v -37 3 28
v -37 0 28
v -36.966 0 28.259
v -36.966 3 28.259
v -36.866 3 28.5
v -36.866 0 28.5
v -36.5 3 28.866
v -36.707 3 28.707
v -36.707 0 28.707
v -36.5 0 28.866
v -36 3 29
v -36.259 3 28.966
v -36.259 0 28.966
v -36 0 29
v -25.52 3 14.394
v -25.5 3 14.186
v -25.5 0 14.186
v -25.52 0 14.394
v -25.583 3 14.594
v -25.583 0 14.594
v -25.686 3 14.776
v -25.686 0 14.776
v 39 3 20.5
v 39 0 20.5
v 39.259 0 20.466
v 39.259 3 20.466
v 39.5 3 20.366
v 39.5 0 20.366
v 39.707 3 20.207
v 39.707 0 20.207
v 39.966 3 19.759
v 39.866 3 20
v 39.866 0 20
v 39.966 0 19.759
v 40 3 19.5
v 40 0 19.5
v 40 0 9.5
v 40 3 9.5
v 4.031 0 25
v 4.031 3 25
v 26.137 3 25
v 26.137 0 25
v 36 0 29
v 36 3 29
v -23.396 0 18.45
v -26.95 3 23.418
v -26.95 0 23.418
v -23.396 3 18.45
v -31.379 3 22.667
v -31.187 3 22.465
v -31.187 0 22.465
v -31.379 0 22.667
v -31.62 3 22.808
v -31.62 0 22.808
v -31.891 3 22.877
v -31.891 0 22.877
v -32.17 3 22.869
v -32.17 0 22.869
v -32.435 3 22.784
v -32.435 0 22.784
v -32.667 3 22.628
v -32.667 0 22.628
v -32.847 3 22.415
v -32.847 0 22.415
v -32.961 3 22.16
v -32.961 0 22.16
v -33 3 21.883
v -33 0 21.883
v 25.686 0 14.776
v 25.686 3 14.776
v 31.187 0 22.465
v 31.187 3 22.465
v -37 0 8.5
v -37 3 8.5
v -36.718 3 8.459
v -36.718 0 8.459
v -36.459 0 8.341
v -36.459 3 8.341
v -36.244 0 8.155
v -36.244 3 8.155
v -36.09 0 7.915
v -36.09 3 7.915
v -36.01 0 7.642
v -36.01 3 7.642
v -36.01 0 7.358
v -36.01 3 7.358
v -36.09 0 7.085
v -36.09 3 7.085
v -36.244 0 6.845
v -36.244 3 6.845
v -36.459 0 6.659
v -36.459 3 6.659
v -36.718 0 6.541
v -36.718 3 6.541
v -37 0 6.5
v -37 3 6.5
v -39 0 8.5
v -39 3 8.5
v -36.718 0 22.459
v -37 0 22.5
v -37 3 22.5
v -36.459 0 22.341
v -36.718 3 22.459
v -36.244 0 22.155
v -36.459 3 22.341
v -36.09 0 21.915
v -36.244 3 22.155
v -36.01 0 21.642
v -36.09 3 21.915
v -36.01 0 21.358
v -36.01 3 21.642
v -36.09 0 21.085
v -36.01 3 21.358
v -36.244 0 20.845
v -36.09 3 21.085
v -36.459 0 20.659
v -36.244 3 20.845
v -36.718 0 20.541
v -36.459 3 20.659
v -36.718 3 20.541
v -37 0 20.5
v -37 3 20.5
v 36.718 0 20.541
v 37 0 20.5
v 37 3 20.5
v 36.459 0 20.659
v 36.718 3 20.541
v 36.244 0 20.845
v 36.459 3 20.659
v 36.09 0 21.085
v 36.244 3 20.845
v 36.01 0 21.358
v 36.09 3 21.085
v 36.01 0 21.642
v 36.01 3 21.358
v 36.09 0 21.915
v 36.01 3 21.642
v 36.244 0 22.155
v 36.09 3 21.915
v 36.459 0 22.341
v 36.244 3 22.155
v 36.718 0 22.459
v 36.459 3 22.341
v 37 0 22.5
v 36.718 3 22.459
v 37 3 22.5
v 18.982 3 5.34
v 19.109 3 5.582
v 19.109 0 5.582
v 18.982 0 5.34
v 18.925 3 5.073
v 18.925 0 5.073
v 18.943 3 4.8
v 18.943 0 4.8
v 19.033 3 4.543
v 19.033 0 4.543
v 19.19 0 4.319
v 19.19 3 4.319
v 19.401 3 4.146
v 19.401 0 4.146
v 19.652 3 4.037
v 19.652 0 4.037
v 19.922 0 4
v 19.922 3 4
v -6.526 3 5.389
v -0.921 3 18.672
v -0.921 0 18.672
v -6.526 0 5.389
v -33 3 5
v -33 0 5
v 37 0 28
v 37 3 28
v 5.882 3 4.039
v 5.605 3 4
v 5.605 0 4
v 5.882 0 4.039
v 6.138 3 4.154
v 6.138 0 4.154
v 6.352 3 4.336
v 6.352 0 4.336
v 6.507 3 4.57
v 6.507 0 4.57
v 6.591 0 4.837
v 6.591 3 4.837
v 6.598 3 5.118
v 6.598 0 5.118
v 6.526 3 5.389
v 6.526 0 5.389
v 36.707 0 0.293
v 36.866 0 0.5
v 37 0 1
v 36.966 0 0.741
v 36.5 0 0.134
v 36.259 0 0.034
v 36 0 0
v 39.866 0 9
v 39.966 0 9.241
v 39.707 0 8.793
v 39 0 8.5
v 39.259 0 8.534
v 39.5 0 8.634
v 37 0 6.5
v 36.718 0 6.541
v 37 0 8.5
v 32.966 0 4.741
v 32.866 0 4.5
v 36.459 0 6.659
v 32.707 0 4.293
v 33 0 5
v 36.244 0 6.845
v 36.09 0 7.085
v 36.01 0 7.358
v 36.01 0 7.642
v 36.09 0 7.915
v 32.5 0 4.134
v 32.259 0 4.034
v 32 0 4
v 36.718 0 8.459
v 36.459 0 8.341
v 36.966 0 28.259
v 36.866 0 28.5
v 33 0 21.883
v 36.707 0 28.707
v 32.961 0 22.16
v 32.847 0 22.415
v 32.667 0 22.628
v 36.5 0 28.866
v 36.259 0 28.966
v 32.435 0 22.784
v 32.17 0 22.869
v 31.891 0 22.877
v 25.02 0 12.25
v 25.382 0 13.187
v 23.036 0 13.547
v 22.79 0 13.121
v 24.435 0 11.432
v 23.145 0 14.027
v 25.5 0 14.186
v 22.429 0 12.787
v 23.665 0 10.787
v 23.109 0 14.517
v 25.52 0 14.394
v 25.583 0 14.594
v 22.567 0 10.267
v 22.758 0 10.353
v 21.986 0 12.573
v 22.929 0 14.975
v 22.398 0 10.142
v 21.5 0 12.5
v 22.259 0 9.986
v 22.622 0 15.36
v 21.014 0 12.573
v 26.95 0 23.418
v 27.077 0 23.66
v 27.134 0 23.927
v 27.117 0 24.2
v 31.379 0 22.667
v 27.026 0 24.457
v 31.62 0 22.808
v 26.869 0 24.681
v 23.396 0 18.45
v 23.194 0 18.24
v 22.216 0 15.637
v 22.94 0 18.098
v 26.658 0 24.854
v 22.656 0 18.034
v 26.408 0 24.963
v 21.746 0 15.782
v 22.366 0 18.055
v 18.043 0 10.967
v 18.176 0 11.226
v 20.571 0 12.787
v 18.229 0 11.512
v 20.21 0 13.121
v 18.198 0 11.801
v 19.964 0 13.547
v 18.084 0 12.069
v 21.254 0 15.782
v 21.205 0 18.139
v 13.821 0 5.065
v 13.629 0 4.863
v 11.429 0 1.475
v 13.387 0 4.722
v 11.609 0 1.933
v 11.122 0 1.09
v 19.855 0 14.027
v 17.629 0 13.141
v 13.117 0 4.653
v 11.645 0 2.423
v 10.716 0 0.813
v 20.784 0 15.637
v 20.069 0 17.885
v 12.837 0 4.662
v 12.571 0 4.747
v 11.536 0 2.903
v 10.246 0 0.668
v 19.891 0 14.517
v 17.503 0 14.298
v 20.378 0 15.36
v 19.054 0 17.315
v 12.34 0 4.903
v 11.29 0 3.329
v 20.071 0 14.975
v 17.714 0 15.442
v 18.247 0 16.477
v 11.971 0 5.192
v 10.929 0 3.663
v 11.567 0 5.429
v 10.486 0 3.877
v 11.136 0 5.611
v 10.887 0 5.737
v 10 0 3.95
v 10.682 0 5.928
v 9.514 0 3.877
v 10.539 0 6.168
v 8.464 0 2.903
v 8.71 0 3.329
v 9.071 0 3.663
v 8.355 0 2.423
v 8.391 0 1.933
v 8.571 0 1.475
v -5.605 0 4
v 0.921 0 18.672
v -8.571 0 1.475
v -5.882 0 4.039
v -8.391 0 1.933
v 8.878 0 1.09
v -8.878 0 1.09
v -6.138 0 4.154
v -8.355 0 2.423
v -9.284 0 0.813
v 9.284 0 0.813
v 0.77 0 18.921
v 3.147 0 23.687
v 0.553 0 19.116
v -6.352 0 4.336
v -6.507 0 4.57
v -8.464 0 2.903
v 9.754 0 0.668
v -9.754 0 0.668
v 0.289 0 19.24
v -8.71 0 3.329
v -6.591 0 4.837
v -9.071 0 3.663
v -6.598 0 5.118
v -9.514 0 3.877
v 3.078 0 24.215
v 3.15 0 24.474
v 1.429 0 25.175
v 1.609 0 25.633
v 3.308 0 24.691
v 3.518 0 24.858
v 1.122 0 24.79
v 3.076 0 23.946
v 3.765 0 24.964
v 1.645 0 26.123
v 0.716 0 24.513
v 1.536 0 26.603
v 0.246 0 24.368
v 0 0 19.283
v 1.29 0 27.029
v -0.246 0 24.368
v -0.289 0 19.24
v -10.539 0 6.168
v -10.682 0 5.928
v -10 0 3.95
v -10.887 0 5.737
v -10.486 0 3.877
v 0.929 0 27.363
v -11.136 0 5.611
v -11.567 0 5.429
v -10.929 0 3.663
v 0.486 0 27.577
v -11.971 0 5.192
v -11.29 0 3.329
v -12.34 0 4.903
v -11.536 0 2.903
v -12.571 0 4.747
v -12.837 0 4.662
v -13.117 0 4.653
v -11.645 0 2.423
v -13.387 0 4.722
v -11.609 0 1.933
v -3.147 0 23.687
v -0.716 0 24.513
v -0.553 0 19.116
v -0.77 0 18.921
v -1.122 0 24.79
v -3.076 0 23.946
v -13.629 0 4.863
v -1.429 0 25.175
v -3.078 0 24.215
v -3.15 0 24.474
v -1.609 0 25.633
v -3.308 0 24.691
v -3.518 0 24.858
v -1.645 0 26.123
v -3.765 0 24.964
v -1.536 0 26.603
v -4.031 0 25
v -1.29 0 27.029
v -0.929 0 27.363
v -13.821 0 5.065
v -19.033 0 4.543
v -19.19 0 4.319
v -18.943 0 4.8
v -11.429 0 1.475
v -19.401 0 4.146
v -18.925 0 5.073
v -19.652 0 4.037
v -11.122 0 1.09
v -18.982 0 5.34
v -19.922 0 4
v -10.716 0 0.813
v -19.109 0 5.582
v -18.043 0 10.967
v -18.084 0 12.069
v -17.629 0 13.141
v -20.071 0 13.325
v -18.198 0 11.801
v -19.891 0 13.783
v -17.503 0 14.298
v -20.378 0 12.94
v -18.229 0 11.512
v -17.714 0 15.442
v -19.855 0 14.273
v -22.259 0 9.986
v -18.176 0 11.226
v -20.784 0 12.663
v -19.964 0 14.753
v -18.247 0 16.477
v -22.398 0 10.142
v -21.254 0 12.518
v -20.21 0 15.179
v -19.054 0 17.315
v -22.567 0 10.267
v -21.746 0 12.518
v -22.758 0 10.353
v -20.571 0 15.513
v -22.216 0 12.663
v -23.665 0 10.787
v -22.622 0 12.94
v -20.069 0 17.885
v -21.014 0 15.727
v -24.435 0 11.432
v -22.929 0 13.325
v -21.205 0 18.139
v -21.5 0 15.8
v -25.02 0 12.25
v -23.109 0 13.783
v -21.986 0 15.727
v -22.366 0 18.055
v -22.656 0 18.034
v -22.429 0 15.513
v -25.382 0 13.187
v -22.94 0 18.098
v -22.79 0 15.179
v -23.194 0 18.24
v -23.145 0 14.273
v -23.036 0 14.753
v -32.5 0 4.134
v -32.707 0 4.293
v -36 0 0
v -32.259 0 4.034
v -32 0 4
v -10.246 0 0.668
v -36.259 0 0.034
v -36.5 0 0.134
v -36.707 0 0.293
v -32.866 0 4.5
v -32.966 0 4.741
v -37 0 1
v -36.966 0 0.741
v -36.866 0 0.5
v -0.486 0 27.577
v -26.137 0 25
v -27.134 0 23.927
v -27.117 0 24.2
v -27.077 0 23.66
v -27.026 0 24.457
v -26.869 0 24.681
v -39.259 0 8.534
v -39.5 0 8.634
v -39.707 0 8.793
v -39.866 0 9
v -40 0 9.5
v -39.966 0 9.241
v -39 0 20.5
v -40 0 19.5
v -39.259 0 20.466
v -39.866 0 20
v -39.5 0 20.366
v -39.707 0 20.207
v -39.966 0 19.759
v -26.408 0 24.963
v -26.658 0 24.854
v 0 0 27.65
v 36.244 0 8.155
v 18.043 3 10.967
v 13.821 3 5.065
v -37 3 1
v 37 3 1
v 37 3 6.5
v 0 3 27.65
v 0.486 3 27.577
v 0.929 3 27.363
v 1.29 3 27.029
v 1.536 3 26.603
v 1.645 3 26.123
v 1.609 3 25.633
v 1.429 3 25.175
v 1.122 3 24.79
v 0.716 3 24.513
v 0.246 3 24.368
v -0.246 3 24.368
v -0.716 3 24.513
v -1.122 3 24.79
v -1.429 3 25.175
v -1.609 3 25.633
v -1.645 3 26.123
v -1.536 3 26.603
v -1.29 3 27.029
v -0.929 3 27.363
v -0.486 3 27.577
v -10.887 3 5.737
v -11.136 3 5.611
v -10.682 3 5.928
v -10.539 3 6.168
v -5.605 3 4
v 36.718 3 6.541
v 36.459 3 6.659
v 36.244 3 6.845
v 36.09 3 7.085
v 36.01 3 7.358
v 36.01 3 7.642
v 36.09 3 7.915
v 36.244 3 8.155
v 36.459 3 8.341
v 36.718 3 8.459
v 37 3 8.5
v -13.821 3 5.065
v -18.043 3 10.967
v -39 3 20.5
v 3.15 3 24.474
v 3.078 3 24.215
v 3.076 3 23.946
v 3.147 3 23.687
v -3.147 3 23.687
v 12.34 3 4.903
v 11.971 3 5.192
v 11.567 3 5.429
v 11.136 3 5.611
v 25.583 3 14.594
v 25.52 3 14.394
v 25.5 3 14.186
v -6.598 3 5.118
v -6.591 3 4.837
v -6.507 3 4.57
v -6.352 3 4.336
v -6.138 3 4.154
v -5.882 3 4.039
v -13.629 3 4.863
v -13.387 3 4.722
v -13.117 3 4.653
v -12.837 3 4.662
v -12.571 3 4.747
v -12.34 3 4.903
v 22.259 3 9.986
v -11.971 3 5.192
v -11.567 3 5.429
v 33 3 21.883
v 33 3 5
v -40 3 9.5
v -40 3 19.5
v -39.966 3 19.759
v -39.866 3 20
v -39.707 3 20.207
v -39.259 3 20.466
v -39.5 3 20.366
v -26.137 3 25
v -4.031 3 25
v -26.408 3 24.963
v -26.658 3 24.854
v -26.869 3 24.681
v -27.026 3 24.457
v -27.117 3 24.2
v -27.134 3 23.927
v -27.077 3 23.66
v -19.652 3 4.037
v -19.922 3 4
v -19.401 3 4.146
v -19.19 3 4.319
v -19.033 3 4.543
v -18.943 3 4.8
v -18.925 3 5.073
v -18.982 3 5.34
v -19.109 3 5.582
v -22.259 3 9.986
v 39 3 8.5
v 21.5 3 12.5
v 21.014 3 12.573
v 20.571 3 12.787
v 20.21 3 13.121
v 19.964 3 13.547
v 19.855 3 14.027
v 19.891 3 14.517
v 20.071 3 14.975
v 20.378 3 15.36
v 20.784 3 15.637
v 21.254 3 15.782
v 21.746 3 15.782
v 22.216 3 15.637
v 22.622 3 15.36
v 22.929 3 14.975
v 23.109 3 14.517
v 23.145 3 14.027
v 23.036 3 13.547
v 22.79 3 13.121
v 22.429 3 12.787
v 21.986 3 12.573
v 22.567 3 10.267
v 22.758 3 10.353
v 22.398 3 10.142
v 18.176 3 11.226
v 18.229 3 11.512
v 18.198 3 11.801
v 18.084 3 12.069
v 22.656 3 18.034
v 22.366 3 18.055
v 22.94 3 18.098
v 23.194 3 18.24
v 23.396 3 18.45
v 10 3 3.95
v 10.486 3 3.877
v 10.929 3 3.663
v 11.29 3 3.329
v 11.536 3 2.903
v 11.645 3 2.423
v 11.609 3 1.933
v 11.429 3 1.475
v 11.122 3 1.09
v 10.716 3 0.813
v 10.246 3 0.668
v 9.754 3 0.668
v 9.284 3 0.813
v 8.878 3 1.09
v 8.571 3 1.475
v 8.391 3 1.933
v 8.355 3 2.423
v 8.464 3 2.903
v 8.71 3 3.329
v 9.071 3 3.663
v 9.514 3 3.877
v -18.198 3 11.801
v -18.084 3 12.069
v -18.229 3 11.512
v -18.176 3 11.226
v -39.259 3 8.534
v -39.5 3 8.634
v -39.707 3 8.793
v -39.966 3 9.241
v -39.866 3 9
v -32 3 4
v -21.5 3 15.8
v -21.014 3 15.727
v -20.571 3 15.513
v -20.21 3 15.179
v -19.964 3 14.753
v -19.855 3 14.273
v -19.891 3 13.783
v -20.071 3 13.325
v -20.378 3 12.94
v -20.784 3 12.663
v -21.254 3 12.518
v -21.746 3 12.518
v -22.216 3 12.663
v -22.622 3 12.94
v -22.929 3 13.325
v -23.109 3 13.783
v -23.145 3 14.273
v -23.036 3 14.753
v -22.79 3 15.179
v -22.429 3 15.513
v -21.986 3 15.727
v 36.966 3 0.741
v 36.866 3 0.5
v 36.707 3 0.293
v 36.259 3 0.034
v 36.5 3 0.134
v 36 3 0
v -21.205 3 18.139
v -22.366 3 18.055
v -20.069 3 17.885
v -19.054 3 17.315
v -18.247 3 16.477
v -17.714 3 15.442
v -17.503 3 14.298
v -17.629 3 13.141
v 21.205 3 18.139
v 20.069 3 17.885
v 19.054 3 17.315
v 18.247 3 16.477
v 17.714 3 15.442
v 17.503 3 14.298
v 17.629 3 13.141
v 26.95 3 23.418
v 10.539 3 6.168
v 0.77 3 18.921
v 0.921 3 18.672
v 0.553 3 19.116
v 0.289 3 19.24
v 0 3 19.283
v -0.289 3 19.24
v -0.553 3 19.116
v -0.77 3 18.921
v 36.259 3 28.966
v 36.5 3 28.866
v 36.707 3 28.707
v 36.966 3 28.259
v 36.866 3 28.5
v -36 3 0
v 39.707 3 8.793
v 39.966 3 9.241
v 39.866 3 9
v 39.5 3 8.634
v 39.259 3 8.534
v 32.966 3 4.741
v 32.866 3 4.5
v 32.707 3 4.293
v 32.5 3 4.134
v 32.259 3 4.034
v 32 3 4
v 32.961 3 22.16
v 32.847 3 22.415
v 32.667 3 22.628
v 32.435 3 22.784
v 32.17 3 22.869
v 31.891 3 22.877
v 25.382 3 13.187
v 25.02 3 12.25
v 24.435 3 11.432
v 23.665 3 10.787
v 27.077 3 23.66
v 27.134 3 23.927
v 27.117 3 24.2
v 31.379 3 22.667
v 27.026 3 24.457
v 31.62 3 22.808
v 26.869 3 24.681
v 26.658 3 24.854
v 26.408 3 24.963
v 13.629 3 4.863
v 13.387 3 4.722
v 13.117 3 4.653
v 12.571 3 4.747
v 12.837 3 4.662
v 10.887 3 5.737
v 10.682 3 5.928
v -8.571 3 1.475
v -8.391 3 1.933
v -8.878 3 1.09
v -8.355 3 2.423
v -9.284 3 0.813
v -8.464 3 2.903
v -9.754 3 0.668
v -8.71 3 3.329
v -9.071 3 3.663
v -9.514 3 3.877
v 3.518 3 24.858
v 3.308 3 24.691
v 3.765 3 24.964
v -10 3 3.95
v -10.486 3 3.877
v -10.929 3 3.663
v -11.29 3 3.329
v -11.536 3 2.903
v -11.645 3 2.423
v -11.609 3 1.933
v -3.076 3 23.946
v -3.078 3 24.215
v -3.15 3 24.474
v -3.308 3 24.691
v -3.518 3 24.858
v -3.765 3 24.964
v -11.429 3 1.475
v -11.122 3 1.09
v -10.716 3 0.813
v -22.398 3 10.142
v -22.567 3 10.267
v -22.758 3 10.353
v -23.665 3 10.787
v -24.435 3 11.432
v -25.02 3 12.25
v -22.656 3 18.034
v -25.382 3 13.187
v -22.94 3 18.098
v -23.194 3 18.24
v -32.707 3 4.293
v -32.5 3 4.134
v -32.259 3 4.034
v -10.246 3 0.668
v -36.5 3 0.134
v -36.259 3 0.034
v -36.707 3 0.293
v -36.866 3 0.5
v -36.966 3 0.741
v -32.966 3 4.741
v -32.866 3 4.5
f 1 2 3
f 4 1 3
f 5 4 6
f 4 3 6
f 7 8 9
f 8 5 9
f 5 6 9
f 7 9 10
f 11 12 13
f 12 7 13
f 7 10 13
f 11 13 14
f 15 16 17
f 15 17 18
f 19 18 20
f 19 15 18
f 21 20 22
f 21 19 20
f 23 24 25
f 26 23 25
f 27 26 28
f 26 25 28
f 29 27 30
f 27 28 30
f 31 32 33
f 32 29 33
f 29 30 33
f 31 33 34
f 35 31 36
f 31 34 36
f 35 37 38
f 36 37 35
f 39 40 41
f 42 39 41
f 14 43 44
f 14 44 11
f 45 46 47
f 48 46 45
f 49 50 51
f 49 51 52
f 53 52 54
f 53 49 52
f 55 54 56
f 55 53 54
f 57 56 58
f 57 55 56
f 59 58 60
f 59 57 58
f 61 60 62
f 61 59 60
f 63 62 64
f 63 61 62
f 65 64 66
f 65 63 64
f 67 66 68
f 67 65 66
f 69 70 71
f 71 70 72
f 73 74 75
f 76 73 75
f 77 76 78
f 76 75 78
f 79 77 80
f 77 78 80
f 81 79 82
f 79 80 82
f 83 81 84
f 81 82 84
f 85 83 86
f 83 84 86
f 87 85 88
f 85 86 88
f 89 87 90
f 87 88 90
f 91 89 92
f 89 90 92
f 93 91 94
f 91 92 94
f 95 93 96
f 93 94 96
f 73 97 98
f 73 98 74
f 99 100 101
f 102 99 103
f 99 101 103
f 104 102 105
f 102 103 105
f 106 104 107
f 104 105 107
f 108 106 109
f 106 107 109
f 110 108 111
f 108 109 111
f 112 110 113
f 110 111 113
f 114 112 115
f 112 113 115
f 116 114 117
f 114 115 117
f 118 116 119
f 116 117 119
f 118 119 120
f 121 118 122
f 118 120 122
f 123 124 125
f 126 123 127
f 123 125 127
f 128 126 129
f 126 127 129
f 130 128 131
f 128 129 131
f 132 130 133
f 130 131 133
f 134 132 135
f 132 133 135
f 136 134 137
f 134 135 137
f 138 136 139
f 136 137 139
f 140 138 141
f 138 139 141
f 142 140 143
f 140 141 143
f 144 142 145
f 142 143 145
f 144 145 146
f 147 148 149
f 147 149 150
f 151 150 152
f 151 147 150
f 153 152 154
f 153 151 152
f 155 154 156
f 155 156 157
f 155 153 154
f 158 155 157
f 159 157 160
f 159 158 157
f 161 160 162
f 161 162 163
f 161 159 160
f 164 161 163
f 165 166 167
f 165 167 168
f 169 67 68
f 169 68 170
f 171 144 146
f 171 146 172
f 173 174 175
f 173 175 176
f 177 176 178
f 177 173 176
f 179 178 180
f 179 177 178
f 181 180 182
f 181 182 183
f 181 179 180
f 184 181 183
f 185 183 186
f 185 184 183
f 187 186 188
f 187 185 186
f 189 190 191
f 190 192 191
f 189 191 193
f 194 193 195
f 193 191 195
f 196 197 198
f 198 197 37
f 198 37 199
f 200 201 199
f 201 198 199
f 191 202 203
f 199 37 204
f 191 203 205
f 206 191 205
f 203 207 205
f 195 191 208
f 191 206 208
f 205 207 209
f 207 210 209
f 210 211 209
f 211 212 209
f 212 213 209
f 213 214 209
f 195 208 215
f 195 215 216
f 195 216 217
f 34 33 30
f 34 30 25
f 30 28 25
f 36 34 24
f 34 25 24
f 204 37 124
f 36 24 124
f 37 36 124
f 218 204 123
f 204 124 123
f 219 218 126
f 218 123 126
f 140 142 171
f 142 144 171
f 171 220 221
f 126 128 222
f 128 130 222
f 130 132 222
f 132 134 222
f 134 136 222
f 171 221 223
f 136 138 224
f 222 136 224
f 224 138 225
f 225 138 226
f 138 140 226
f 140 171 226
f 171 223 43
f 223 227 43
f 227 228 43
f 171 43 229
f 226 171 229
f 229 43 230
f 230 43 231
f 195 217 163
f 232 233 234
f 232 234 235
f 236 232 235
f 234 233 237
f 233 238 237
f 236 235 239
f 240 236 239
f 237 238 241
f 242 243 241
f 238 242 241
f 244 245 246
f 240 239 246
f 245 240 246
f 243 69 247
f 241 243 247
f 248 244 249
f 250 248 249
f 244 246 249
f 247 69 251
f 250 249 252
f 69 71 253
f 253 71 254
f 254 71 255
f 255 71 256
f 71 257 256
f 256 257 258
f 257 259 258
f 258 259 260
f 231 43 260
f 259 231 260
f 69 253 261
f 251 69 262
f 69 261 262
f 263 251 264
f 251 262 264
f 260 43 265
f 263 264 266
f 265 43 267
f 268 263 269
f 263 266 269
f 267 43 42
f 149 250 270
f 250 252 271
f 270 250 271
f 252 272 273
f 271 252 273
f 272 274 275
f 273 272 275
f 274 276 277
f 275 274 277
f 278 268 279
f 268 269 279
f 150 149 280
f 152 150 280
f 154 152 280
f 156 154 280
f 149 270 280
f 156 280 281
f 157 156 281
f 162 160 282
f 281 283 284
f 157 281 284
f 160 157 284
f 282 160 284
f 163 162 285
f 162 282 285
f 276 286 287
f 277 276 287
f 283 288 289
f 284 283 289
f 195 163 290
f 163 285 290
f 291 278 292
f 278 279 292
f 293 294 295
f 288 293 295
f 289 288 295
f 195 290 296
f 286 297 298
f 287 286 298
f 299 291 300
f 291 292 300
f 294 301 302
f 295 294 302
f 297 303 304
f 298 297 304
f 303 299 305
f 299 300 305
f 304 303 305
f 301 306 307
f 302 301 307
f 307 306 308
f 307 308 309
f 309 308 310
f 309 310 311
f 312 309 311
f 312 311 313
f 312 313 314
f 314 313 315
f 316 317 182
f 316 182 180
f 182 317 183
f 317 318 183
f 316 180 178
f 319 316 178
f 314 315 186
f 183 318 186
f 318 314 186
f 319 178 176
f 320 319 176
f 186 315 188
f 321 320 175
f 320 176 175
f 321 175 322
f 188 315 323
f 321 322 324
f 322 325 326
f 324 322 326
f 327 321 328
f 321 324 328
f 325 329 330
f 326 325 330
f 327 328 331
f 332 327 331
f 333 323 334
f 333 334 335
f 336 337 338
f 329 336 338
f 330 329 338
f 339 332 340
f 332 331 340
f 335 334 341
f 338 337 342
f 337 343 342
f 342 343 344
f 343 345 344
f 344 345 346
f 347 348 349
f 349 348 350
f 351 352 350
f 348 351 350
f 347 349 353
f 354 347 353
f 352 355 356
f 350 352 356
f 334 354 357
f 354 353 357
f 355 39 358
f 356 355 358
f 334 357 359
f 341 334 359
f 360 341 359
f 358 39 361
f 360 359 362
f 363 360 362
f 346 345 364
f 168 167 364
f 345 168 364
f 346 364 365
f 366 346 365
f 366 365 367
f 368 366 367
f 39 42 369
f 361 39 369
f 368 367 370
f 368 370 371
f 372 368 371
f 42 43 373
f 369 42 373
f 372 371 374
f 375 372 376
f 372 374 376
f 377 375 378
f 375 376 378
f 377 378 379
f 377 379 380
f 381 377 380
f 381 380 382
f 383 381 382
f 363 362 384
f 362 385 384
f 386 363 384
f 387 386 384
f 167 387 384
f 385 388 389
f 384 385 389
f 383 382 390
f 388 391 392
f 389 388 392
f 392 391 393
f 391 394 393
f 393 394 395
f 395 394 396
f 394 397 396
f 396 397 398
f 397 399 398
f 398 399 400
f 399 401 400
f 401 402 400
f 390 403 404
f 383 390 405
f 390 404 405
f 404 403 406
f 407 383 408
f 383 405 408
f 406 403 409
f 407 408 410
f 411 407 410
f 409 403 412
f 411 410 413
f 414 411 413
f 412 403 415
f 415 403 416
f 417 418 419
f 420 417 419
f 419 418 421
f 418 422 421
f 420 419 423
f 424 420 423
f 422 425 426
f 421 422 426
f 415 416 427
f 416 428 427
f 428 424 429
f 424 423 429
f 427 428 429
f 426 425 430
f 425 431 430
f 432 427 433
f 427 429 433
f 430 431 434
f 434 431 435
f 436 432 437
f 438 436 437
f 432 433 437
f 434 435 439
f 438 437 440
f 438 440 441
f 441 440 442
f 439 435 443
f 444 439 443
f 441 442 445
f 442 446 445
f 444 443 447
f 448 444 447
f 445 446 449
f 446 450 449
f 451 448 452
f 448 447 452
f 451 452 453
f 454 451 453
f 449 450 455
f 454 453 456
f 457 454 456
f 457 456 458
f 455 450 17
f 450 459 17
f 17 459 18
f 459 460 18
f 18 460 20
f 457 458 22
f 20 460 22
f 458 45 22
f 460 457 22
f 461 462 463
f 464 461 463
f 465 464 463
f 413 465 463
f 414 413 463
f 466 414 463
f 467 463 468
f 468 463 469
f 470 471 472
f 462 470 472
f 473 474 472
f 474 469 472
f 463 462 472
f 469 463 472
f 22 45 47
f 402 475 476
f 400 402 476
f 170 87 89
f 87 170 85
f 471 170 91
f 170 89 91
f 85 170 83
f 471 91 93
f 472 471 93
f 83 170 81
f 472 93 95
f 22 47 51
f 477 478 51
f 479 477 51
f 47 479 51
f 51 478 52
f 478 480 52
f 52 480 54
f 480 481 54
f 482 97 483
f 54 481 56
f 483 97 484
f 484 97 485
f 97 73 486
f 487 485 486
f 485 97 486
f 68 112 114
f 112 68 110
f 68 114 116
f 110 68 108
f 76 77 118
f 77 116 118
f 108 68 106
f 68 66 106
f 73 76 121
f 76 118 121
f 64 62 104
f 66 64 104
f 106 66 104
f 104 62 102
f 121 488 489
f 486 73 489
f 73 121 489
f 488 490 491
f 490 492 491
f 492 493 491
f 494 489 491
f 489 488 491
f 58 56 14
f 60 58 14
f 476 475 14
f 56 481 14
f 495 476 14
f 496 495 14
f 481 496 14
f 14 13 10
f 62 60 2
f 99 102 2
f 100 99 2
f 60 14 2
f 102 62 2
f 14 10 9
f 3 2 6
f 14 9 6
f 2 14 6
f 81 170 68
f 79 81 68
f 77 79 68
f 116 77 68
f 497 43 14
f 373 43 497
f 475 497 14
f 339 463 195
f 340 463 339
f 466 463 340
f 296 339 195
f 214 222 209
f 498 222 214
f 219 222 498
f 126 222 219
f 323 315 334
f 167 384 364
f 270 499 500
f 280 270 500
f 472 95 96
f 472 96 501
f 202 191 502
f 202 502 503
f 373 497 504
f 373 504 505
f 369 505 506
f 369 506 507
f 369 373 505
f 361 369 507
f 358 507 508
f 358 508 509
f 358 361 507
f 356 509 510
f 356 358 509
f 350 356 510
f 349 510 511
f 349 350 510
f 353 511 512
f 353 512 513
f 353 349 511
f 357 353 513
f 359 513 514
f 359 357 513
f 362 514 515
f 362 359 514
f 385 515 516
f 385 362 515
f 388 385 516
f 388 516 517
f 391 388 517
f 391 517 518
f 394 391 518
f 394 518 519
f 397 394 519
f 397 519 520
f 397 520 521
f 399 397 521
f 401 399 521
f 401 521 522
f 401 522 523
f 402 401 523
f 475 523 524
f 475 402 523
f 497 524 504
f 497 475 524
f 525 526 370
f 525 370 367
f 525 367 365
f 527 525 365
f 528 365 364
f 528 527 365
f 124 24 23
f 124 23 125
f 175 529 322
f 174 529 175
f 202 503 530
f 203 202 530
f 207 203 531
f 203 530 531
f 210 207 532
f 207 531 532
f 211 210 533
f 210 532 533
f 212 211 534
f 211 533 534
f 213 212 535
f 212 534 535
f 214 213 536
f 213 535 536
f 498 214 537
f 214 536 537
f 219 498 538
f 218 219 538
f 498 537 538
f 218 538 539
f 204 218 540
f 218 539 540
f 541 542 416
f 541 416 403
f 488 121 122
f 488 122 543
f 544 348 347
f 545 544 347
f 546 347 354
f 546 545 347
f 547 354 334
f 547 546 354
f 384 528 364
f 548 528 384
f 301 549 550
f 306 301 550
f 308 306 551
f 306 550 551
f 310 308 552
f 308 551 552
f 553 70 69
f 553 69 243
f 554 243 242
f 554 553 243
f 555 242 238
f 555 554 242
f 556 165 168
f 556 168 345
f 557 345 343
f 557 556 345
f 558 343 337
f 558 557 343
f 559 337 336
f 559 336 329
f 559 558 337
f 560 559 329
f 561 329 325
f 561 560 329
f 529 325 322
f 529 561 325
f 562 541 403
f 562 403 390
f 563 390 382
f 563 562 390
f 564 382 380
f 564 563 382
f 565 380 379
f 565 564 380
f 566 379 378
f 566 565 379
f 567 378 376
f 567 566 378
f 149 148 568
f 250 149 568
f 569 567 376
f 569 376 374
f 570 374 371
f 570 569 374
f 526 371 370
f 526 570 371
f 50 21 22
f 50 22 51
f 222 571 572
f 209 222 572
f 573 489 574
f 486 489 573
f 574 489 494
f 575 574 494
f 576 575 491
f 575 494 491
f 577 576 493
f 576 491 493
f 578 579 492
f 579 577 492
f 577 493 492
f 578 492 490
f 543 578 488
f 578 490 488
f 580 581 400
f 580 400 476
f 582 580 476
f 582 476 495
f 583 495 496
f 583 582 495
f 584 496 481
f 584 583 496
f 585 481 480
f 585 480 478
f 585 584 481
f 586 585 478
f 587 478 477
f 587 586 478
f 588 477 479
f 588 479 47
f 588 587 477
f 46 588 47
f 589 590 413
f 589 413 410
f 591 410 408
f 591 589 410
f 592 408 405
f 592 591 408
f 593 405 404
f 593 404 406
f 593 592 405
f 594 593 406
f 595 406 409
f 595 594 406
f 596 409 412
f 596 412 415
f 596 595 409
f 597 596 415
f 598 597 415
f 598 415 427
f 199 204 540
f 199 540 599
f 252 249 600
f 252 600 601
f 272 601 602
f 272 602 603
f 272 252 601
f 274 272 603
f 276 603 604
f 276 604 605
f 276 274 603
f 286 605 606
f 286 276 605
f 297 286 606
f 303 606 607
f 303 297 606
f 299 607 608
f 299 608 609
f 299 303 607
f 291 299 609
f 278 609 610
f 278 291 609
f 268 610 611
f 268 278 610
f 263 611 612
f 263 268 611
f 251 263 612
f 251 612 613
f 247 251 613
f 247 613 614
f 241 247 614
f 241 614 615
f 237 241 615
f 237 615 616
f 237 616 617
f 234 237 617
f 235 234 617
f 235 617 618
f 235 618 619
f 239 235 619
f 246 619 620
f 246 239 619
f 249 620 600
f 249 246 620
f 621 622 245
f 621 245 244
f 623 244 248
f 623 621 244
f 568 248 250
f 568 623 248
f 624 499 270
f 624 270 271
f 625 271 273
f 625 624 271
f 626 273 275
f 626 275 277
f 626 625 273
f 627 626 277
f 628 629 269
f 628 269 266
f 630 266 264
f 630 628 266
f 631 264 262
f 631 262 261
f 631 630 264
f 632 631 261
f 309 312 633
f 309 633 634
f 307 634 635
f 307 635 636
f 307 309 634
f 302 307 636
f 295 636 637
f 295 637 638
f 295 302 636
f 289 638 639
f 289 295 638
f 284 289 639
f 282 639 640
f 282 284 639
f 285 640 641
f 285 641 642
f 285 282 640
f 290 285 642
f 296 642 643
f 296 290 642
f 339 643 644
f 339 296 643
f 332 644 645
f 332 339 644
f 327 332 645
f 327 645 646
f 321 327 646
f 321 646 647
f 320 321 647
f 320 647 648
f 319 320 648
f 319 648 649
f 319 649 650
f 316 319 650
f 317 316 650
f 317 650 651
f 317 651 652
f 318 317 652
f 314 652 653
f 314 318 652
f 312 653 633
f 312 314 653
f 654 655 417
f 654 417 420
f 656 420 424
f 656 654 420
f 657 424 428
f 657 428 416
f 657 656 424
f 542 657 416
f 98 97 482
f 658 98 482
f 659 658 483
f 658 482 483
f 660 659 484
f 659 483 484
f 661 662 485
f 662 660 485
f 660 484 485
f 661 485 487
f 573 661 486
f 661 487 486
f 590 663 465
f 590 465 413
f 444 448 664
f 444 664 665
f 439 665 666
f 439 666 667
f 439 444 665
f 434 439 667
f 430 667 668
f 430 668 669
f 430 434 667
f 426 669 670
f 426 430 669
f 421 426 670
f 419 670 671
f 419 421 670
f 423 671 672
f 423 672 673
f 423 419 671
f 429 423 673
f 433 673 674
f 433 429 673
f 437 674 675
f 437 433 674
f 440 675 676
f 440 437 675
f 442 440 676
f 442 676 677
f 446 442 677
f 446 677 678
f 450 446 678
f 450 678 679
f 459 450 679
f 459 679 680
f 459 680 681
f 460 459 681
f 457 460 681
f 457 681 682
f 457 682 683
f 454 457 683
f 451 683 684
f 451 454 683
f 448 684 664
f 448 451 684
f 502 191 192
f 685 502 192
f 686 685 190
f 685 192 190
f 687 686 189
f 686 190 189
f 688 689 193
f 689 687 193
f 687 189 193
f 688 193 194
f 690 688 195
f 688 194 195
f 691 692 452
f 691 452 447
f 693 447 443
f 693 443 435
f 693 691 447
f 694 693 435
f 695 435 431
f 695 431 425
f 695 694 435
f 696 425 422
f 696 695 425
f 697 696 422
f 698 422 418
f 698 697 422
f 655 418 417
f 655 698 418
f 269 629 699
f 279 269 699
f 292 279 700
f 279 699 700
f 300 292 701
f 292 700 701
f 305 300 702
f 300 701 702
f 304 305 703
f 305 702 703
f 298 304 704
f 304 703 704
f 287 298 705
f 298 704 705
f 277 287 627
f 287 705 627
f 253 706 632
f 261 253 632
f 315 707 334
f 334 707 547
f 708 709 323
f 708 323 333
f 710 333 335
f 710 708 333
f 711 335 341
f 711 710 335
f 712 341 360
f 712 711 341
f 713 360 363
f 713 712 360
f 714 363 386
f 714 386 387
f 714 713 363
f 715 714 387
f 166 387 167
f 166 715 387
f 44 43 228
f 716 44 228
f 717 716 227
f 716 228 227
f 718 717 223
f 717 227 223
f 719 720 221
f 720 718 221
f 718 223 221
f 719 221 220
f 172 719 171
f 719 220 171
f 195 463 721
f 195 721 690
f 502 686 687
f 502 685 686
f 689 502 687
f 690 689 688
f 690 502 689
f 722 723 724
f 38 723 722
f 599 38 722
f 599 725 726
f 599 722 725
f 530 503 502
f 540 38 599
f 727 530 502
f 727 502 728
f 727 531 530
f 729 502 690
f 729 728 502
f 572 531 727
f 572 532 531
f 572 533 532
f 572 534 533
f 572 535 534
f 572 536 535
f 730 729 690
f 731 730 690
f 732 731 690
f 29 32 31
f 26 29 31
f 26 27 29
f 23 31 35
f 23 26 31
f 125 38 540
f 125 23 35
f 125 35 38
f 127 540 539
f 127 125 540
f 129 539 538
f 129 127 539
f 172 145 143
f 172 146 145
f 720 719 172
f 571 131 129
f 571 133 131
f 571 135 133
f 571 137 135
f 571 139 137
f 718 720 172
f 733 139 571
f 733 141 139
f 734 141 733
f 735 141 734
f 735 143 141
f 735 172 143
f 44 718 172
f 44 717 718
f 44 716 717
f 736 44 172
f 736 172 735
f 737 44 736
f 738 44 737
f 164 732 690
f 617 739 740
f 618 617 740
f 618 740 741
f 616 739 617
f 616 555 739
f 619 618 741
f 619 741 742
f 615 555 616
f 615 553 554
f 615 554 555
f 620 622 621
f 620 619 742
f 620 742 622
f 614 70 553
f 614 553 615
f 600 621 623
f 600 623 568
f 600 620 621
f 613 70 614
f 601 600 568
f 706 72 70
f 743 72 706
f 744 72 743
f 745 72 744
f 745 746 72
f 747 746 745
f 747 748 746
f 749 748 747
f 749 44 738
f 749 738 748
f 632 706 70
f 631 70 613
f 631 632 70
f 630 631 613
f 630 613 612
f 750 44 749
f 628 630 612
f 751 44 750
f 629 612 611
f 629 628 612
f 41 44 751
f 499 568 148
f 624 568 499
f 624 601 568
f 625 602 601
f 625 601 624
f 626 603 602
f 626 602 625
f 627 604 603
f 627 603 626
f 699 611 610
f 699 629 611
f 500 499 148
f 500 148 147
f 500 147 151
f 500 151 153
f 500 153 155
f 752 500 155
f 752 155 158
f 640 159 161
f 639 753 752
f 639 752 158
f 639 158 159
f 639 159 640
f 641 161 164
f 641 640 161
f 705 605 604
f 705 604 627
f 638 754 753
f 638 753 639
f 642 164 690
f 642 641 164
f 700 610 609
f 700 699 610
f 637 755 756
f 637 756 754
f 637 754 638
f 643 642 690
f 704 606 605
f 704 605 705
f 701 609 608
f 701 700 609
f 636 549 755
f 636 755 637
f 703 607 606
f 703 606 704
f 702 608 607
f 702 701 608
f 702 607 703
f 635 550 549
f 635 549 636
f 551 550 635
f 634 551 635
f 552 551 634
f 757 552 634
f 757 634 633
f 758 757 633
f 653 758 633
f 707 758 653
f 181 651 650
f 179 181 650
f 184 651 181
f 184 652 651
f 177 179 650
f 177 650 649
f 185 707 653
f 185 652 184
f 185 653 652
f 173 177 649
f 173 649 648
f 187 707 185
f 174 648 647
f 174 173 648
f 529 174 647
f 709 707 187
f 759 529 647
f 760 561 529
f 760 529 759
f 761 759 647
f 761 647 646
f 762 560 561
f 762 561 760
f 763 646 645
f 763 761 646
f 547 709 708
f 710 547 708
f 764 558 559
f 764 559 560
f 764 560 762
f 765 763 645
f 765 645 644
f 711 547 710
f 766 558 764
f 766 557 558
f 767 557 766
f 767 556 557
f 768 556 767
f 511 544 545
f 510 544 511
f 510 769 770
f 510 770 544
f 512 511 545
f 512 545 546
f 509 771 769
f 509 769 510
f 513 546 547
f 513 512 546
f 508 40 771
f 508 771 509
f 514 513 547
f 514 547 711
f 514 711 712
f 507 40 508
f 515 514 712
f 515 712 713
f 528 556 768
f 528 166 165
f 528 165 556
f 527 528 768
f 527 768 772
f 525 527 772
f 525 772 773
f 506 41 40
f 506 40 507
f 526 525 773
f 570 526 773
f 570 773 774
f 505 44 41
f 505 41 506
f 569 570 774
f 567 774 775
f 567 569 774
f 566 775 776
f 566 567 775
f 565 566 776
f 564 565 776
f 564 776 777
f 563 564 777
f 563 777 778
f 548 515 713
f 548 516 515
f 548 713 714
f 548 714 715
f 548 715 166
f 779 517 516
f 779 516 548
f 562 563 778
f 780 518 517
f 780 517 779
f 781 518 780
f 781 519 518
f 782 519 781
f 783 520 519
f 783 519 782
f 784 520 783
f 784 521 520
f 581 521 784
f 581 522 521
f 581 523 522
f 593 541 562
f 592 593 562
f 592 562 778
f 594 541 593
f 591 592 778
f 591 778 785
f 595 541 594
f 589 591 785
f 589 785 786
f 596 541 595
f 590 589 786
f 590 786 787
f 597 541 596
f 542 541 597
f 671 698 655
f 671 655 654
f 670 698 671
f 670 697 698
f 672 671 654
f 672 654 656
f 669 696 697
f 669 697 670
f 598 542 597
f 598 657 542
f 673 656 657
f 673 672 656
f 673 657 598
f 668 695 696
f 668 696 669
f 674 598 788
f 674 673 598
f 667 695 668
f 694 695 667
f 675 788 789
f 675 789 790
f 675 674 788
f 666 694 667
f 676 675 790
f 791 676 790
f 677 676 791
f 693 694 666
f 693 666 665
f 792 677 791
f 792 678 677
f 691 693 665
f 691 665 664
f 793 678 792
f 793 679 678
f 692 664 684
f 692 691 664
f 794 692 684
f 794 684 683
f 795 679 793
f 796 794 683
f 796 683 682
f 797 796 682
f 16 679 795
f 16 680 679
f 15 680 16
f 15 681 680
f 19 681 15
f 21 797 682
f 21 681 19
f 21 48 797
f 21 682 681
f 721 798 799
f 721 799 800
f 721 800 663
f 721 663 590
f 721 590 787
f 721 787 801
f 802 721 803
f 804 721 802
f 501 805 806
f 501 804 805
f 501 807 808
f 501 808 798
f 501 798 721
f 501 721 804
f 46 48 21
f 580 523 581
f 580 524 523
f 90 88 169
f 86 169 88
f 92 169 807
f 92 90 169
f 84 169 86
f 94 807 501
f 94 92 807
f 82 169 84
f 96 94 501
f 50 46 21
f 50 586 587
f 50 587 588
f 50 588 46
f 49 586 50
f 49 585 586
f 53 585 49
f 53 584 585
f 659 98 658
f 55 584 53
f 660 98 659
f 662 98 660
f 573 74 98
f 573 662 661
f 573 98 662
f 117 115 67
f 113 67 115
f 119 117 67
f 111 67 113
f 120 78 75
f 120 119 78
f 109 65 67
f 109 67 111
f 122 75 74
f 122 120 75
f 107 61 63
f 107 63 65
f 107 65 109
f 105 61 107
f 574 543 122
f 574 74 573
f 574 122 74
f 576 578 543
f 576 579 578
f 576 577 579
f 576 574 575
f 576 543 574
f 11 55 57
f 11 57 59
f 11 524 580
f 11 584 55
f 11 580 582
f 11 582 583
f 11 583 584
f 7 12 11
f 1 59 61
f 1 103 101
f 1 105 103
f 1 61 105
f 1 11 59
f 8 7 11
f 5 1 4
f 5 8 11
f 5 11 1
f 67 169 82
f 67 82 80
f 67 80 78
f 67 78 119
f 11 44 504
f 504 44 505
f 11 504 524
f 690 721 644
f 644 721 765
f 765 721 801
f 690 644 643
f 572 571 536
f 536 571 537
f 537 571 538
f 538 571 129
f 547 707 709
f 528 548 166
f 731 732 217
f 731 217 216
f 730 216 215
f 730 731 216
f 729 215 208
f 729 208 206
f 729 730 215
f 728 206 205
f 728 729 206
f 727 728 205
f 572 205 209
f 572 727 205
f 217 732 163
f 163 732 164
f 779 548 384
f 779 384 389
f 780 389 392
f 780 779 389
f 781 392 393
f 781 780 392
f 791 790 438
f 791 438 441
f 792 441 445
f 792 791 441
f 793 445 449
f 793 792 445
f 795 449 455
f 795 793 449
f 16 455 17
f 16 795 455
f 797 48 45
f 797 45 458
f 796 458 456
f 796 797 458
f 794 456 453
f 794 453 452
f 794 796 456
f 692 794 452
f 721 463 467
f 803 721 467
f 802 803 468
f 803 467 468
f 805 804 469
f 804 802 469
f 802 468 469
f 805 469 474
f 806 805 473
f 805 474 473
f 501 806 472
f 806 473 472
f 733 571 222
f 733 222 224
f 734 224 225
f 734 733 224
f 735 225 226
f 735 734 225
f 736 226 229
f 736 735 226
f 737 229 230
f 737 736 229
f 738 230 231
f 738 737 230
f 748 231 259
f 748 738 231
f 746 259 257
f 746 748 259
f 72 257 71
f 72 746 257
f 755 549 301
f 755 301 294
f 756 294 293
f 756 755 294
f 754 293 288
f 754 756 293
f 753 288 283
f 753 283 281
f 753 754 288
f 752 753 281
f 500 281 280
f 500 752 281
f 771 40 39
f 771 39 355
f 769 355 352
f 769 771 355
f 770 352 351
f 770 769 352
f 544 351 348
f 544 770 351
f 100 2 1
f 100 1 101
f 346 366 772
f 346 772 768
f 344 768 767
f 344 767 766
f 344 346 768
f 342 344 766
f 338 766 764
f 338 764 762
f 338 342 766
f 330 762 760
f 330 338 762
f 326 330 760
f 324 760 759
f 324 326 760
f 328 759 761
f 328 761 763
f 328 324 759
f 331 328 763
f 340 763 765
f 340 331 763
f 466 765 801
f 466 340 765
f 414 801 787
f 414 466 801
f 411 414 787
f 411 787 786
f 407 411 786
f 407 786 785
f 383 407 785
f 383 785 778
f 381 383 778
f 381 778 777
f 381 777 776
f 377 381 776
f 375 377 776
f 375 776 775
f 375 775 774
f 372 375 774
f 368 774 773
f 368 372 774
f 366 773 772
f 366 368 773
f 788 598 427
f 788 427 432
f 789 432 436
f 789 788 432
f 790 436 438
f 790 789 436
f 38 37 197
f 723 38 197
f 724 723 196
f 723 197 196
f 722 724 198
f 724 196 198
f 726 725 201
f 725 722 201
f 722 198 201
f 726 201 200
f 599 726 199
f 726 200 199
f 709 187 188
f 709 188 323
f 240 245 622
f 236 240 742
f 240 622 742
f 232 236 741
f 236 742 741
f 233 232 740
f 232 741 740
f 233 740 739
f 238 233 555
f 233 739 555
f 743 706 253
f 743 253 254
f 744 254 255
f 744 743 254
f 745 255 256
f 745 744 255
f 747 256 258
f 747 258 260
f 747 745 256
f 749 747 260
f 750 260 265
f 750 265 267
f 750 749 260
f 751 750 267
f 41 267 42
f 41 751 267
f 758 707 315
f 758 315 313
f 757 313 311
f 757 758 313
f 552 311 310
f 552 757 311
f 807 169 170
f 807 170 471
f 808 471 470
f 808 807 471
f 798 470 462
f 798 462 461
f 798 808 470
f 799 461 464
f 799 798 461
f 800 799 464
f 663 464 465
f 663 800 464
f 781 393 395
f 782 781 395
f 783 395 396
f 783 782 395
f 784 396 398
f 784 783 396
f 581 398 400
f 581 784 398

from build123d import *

# Parameters (mm, degrees)
SKETCH_3_R          = 1.65
EXTRUDE_6_DEPTH     = 3
SKETCH_4_R          = 1
CUT_EXTRUDE_1_DEPTH = 50.497474683
FILLET_1_R          = 1


with BuildPart() as part:
    # 草图3 → 凸台-拉伸6 (new body)
    with BuildSketch(Plane(origin=(0, 0, 0), x_dir=(1, 0, 0), z_dir=(0, 1, 0))):
        Polygon((-37, -20.5), (-40, -20.5), (-40, -8.5), (-37, -8.5), (-37, 0), (37, 0), (37, -8.5), (40, -8.5), (40, -20.5), (37, -20.5), (37, -29), (-37, -29), align=None)
        with Locations(Location((-10, -2.3, 0), (0, 0, 270))):
            Circle(SKETCH_3_R, mode=Mode.SUBTRACT)
        with Locations(Location((10, -2.3, 0), (0, 0, 270))):
            Circle(SKETCH_3_R, mode=Mode.SUBTRACT)
        with Locations(Location((0, -26, 0), (0, 0, 270))):
            Circle(SKETCH_3_R, mode=Mode.SUBTRACT)
        with Locations(Location((-21.5, -14.15, 0), (0, 0, 270))):
            Circle(SKETCH_3_R, mode=Mode.SUBTRACT)
        with Locations(Location((21.5, -14.15, 0), (0, 0, 90))):
            Circle(SKETCH_3_R, mode=Mode.SUBTRACT)
    extrude(amount=EXTRUDE_6_DEPTH)

    # 草图4 → 切除-拉伸1 (cut, through all)
    with BuildSketch(Plane(origin=(0, 3, 0), x_dir=(1, 0, 0), z_dir=(0, 1, 0))):
        with Locations((-37, -7.5)):
            Circle(SKETCH_4_R)
        with Locations((-37, -21.5)):
            Circle(SKETCH_4_R)
        with Locations((37, -21.5)):
            Circle(SKETCH_4_R)
        with Locations((37, -7.5)):
            Circle(SKETCH_4_R)
        with BuildLine():
            Line((-33, -4), (-17.977516568, -4))
            Line((-17.977516568, -4), (-22.460716028, -10.267085539))
            ThreePointArc((-22.460716028, -10.267085539), (-24.753285657, -11.822741434), (-25.485103536, -14.494891011))
            Line((-25.485103536, -14.494891011), (-33, -25))
            Line((-33, -25), (-33, -4))
        make_face()
        with BuildLine():
            Line((-28.08189514, -25), (-22.978936608, -17.866550351))
            ThreePointArc((-22.978936608, -17.866550351), (-18.246714343, -16.477258566), (-18.460311642, -11.549943331))
            Line((-18.460311642, -11.549943331), (-13.059411708, -4))
            ThreePointArc((-13.059411708, -4), (-12.079761561, -5.115065159), (-10.726079501, -5.723858723))
            Line((-10.726079501, -5.723858723), (-2.959290121, -24.131149556))
            ThreePointArc((-2.959290121, -24.131149556), (-3.186448679, -24.552054968), (-3.354101966, -25))
            Line((-3.354101966, -25), (-28.08189514, -25))
        make_face()
        Polygon((-7.111954792, -4), (7.111954792, -4), (0, -20.855332858), align=None)
        with BuildLine():
            Line((33, -25), (33, -4))
            Line((33, -4), (17.977516568, -4))
            Line((17.977516568, -4), (22.460716028, -10.267085539))
            ThreePointArc((22.460716028, -10.267085539), (24.753285657, -11.822741434), (25.485103536, -14.494891011))
            Line((25.485103536, -14.494891011), (33, -25))
        make_face()
        with BuildLine():
            Line((3.354101966, -25), (28.08189514, -25))
            Line((28.08189514, -25), (22.978936608, -17.866550351))
            ThreePointArc((22.978936608, -17.866550351), (18.246714343, -16.477258566), (18.460311642, -11.549943331))
            Line((18.460311642, -11.549943331), (13.059411708, -4))
            ThreePointArc((13.059411708, -4), (12.079761561, -5.115065159), (10.726079501, -5.723858723))
            Line((10.726079501, -5.723858723), (2.959290121, -24.131149556))
            ThreePointArc((2.959290121, -24.131149556), (3.186448679, -24.552054968), (3.354101966, -25))
        make_face()
    extrude(amount=-CUT_EXTRUDE_1_DEPTH, mode=Mode.SUBTRACT)

    # 圆角1
    # the kernel refuses this fillet: 1 mm, written as the material it adds along each edge
    with BuildSketch(Plane(origin=(17.977516568, 3, 4), x_dir=(1, 0, 0), z_dir=(0, -1, 0)), Plane(origin=(-28.08189514, 3, 25), x_dir=(0.5818146414920115, 0, -0.8133214142917436), z_dir=(0, -1, 0)), Plane(origin=(-17.977516568, 3, 4), x_dir=(-0.5818146414920105, 0, 0.8133214142917444), z_dir=(0, -1, 0))) as fillet_1_piece_1:
        with BuildLine():
            CenterArc((FILLET_1_R * 1.94488256881, FILLET_1_R), FILLET_1_R, 144.421723672, 125.578276328)
            Line((FILLET_1_R * 1.13156115451, FILLET_1_R * 1.58181464149), (0, 0))
            Line((0, 0), (FILLET_1_R * 1.94488256881, 0))
        make_face()
    extrude(amount=3)
    with BuildSketch(Plane(origin=(33, 3, 4), x_dir=(-1, 0, 0), z_dir=(0, -1, 0)), Plane(origin=(-33, 3, 4), x_dir=(0, 0, 1), z_dir=(0, -1, 0))) as fillet_1_piece_2:
        with BuildLine():
            CenterArc((FILLET_1_R, -FILLET_1_R), FILLET_1_R, 90, 90)
            Line((0, -FILLET_1_R), (0, 0))
            Line((0, 0), (FILLET_1_R, 0))
        make_face()
    extrude(amount=3)
    with BuildSketch(Plane(origin=(2.959290121, 3, 24.131149556), x_dir=(0.38875206983693955, 0, -0.9213424055135502), z_dir=(0, -1, 0))) as fillet_1_piece_3:
        with BuildLine():
            CenterArc((0.481820643, 1), FILLET_1_R, 221.810314896, 48.189685104)
            ThreePointArc((-0.26353535, 0.333333333), (-0.126704365, 0.17066975), (0, 0))
            Line((0, 0), (0.481820643, 0))
        make_face()
    extrude(amount=3)
    with BuildSketch(Plane(origin=(10.726079501, 3, 5.723858723), x_dir=(-0.38875206983694, 0, 0.92134240551355), z_dir=(0, -1, 0)), Plane(origin=(-2.959290121, 3, 24.131149556), x_dir=(-0.38875206983693955, 0, -0.9213424055135502), z_dir=(0, -1, 0))) as fillet_1_piece_4:
        with BuildLine():
            CenterArc((0.481820643, -1), FILLET_1_R, 90, 48.189685104)
            ThreePointArc((-0.26353535, -0.333333333), (-0.126704365, -0.17066975), (0, 0))
            Line((0, 0), (0.481820643, 0))
        make_face()
    extrude(amount=3)
    with BuildSketch(Plane(origin=(13.059411708, 3, 4), x_dir=(-0.6232784406716191, 0, 0.7819999906610966), z_dir=(0, -1, 0))) as fillet_1_piece_5:
        with BuildLine():
            CenterArc((1.319920856, -0.986295222), FILLET_1_R, 99.496659768, 96.369123068)
            Line((0.358016109, -1.259680038), (0, 0))
            ThreePointArc((0, 0), (0.577465375, -0.047966724), (1.154930749, 0))
        make_face()
    extrude(amount=3)
    with BuildSketch(Plane(origin=(18.460311642, 3, 11.549943331), x_dir=(-0.5818146414920088, 0, -0.8133214142917455), z_dir=(0, -1, 0)), Plane(origin=(-22.978936608, 3, 17.866550351), x_dir=(-0.581814641492012, 0, 0.8133214142917432), z_dir=(0, -1, 0))) as fillet_1_piece_6:
        with BuildLine():
            CenterArc((0.716825297, -1), FILLET_1_R, 90, 66.927317505)
            ThreePointArc((-0.203183154, -0.608101481), (-0.089388104, -0.308128251), (0, 0))
            Line((0, 0), (0.716825297, 0))
        make_face()
    extrude(amount=3)
    with BuildSketch(Plane(origin=(22.978936608, 3, 17.866550351), x_dir=(-0.9557806548183481, 0, 0.29408049897096183), z_dir=(0, -1, 0)), Plane(origin=(-18.460311642, 3, 11.549943331), x_dir=(0.5870204705662555, 0, 0.8095720889063382), z_dir=(0, -1, 0))) as fillet_1_piece_7:
        with BuildLine():
            CenterArc((0.721291541, -0.996783336), FILLET_1_R, 94.59681443, 66.927317505)
            Line((-0.227165673, -0.679878124), (0, 0))
            ThreePointArc((0, 0), (0.320574018, -0.012866657), (0.641148037, 0))
        make_face()
    extrude(amount=3)
    with BuildSketch(Plane(origin=(28.08189514, 3, 25), x_dir=(-0.5818146414920125, 0, -0.813321414291743), z_dir=(0, -1, 0))) as fillet_1_piece_8:
        with BuildLine():
            CenterArc((FILLET_1_R * 1.94488256881, -FILLET_1_R), FILLET_1_R, 90, 125.578276328)
            Line((FILLET_1_R * 1.13156115451, -FILLET_1_R * 1.58181464149), (0, 0))
            Line((0, 0), (FILLET_1_R * 1.94488256881, 0))
        make_face()
    extrude(amount=3)
    with BuildSketch(Plane(origin=(3.354101966, 3, 25), x_dir=(1, 0, 0), z_dir=(0, -1, 0))) as fillet_1_piece_9:
        with BuildLine():
            CenterArc((0.677026908, -1), FILLET_1_R, 90, 63.612200039)
            ThreePointArc((-0.218779509, -0.555555556), (-0.09752127, -0.282451624), (0, 0))
            Line((0, 0), (0.677026908, 0))
        make_face()
    extrude(amount=3)
    with BuildSketch(Plane(origin=(-13.059411708, 3, 4), x_dir=(-0.5818146414920109, 0, 0.8133214142917442), z_dir=(0, -1, 0))) as fillet_1_piece_10:
        with BuildLine():
            CenterArc((1.309568376, -1), FILLET_1_R, 90, 96.369123068)
            ThreePointArc((0.31574053, -1.11093337), (0.204009684, -0.542353311), (0, 0))
            Line((0, 0), (1.309568376, 0))
        make_face()
    extrude(amount=3)
    with BuildSketch(Plane(origin=(-10.726079501, 3, 5.723858723), x_dir=(-0.9638482393906854, 0, -0.26645181820260827), z_dir=(0, -1, 0))) as fillet_1_piece_11:
        with BuildLine():
            CenterArc((0.485629561, -0.99815583), FILLET_1_R, 93.480205158, 48.189685104)
            Line((-0.298820999, -0.377964473), (0, 0))
            ThreePointArc((0, 0), (0.212462933, -0.006454594), (0.424925866, 0))
        make_face()
    extrude(amount=3)
    with BuildSketch(Plane(origin=(-3.354101966, 3, 25), x_dir=(0.3664147496948947, 0, -0.9304516275476269), z_dir=(0, -1, 0))) as fillet_1_piece_12:
        with BuildLine():
            CenterArc((0.682378983, -0.996355538), FILLET_1_R, 94.893125181, 63.612200039)
            Line((-0.248072645, -0.629940788), (0, 0))
            ThreePointArc((0, 0), (0.298540805, -0.012755617), (0.59708161, 0))
        make_face()
    extrude(amount=3)
    with BuildSketch(Plane(origin=(-7.111954792, 3, 4), x_dir=(0.38875206983694144, 0, 0.9213424055135496), z_dir=(0, -1, 0))) as fillet_1_piece_13:
        with BuildLine():
            CenterArc((FILLET_1_R * 1.507313743, -FILLET_1_R), FILLET_1_R, 90, 112.876871805)
            Line((FILLET_1_R * 0.585971337484, -FILLET_1_R * 1.38875206984), (0, 0))
            Line((0, 0), (FILLET_1_R * 1.507313743, 0))
        make_face()
    extrude(amount=3)
    with BuildSketch(Plane(origin=(7.111954792, 3, 4), x_dir=(-0.38875206983694094, 0, 0.9213424055135497), z_dir=(0, -1, 0))) as fillet_1_piece_14:
        with BuildLine():
            CenterArc((FILLET_1_R * 1.507313743, FILLET_1_R), FILLET_1_R, 157.123128195, 112.876871805)
            Line((FILLET_1_R * 0.585971337484, FILLET_1_R * 1.38875206984), (0, 0))
            Line((0, 0), (FILLET_1_R * 1.507313743, 0))
        make_face()
    extrude(amount=3)
    with BuildSketch(Plane(origin=(0, 3, 20.855332858), x_dir=(0.38875206983694144, 0, -0.9213424055135495), z_dir=(0, -1, 0))) as fillet_1_piece_15:
        with BuildLine():
            CenterArc((FILLET_1_R * 2.37, -FILLET_1_R), FILLET_1_R, 90, 134.246256391)
            Line((FILLET_1_R * 1.65365246566, -FILLET_1_R * 1.69774365639), (0, 0))
            Line((0, 0), (FILLET_1_R * 2.37, 0))
        make_face()
    extrude(amount=3)
    with BuildSketch(Plane(origin=(33, 3, 25), x_dir=(0, 0, -1), z_dir=(0, -1, 0)), Plane(origin=(-33, 3, 25), x_dir=(0.5818146414920113, 0, -0.8133214142917439), z_dir=(0, -1, 0))) as fillet_1_piece_16:
        with BuildLine():
            CenterArc((FILLET_1_R * 3.11666514552, -FILLET_1_R), FILLET_1_R, 90, 144.421723672)
            Line((FILLET_1_R * 2.53485050403, -FILLET_1_R * 1.81332141429), (0, 0))
            Line((0, 0), (FILLET_1_R * 3.11666514552, 0))
        make_face()
    extrude(amount=3)
    with BuildSketch(Plane(origin=(25.485103536, 3, 14.494891011), x_dir=(0.5818146414920119, 0, 0.8133214142917433), z_dir=(0, -1, 0)), Plane(origin=(-22.460716028, 3, 10.267085539), x_dir=(0.5818146414920021, 0, -0.8133214142917503), z_dir=(0, -1, 0))) as fillet_1_piece_17:
        with BuildLine():
            CenterArc((0.346117617, -1), FILLET_1_R, 90, 36.089146464)
            ThreePointArc((-0.242925672, -0.191898519), (-0.11960566, -0.098300271), (0, 0))
            Line((0, 0), (0.346117617, 0))
        make_face()
    extrude(amount=3)
    with BuildSketch(Plane(origin=(22.460716028, 3, 10.267085539), x_dir=(0.9607072883816618, 0, 0.277563517145814), z_dir=(0, -1, 0)), Plane(origin=(-25.485103536, 3, 14.494891011), x_dir=(-0.04760515714824153, 0, -0.99886623179127), z_dir=(0, -1, 0))) as fillet_1_piece_18:
        with BuildLine():
            CenterArc((0.348274134, -0.999250986), FILLET_1_R, 92.217735732, 36.089146464)
            Line((-0.271599158, -0.214549067), (0, 0))
            ThreePointArc((0, 0), (0.154788504, -0.002996057), (0.309577008, 0))
        make_face()
    extrude(amount=3)
    # the kernel refuses this fillet: 1 mm, written as the material it takes off along each edge
    with BuildSketch(Plane(origin=(-37, -2.5, 0), x_dir=(0, 0, 1), z_dir=(0, 1, 0)), Plane(origin=(37, -2.5, 0), x_dir=(-1, 0, 0), z_dir=(0, 1, 0)), Plane(origin=(40, -2.5, 8.5), x_dir=(-1, 0, 0), z_dir=(0, 1, 0)), Plane(origin=(40, -2.5, 20.5), x_dir=(0, 0, -1), z_dir=(0, 1, 0)), Plane(origin=(37, -2.5, 29), x_dir=(0, 0, -1), z_dir=(0, 1, 0)), Plane(origin=(-40, -2.5, 20.5), x_dir=(1, 0, 0), z_dir=(0, 1, 0)), Plane(origin=(-40, -2.5, 8.5), x_dir=(0, 0, 1), z_dir=(0, 1, 0))) as fillet_1_2_piece_1:
        with BuildLine():
            CenterArc((FILLET_1_R, FILLET_1_R), FILLET_1_R, 180, 90)
            Line((0, FILLET_1_R), (0, 0))
            Line((0, 0), (FILLET_1_R, 0))
        make_face()
    extrude(amount=8, mode=Mode.SUBTRACT)
    with BuildSketch(Plane(origin=(-37, -2.5, 29), x_dir=(0, 0, -1), z_dir=(0, 1, 0))) as fillet_1_2_piece_2:
        with BuildLine():
            CenterArc((FILLET_1_R, -FILLET_1_R), FILLET_1_R, 90, 90)
            Line((0, -FILLET_1_R), (0, 0))
            Line((0, 0), (FILLET_1_R, 0))
        make_face()
    extrude(amount=8, mode=Mode.SUBTRACT)


solid = part.part
